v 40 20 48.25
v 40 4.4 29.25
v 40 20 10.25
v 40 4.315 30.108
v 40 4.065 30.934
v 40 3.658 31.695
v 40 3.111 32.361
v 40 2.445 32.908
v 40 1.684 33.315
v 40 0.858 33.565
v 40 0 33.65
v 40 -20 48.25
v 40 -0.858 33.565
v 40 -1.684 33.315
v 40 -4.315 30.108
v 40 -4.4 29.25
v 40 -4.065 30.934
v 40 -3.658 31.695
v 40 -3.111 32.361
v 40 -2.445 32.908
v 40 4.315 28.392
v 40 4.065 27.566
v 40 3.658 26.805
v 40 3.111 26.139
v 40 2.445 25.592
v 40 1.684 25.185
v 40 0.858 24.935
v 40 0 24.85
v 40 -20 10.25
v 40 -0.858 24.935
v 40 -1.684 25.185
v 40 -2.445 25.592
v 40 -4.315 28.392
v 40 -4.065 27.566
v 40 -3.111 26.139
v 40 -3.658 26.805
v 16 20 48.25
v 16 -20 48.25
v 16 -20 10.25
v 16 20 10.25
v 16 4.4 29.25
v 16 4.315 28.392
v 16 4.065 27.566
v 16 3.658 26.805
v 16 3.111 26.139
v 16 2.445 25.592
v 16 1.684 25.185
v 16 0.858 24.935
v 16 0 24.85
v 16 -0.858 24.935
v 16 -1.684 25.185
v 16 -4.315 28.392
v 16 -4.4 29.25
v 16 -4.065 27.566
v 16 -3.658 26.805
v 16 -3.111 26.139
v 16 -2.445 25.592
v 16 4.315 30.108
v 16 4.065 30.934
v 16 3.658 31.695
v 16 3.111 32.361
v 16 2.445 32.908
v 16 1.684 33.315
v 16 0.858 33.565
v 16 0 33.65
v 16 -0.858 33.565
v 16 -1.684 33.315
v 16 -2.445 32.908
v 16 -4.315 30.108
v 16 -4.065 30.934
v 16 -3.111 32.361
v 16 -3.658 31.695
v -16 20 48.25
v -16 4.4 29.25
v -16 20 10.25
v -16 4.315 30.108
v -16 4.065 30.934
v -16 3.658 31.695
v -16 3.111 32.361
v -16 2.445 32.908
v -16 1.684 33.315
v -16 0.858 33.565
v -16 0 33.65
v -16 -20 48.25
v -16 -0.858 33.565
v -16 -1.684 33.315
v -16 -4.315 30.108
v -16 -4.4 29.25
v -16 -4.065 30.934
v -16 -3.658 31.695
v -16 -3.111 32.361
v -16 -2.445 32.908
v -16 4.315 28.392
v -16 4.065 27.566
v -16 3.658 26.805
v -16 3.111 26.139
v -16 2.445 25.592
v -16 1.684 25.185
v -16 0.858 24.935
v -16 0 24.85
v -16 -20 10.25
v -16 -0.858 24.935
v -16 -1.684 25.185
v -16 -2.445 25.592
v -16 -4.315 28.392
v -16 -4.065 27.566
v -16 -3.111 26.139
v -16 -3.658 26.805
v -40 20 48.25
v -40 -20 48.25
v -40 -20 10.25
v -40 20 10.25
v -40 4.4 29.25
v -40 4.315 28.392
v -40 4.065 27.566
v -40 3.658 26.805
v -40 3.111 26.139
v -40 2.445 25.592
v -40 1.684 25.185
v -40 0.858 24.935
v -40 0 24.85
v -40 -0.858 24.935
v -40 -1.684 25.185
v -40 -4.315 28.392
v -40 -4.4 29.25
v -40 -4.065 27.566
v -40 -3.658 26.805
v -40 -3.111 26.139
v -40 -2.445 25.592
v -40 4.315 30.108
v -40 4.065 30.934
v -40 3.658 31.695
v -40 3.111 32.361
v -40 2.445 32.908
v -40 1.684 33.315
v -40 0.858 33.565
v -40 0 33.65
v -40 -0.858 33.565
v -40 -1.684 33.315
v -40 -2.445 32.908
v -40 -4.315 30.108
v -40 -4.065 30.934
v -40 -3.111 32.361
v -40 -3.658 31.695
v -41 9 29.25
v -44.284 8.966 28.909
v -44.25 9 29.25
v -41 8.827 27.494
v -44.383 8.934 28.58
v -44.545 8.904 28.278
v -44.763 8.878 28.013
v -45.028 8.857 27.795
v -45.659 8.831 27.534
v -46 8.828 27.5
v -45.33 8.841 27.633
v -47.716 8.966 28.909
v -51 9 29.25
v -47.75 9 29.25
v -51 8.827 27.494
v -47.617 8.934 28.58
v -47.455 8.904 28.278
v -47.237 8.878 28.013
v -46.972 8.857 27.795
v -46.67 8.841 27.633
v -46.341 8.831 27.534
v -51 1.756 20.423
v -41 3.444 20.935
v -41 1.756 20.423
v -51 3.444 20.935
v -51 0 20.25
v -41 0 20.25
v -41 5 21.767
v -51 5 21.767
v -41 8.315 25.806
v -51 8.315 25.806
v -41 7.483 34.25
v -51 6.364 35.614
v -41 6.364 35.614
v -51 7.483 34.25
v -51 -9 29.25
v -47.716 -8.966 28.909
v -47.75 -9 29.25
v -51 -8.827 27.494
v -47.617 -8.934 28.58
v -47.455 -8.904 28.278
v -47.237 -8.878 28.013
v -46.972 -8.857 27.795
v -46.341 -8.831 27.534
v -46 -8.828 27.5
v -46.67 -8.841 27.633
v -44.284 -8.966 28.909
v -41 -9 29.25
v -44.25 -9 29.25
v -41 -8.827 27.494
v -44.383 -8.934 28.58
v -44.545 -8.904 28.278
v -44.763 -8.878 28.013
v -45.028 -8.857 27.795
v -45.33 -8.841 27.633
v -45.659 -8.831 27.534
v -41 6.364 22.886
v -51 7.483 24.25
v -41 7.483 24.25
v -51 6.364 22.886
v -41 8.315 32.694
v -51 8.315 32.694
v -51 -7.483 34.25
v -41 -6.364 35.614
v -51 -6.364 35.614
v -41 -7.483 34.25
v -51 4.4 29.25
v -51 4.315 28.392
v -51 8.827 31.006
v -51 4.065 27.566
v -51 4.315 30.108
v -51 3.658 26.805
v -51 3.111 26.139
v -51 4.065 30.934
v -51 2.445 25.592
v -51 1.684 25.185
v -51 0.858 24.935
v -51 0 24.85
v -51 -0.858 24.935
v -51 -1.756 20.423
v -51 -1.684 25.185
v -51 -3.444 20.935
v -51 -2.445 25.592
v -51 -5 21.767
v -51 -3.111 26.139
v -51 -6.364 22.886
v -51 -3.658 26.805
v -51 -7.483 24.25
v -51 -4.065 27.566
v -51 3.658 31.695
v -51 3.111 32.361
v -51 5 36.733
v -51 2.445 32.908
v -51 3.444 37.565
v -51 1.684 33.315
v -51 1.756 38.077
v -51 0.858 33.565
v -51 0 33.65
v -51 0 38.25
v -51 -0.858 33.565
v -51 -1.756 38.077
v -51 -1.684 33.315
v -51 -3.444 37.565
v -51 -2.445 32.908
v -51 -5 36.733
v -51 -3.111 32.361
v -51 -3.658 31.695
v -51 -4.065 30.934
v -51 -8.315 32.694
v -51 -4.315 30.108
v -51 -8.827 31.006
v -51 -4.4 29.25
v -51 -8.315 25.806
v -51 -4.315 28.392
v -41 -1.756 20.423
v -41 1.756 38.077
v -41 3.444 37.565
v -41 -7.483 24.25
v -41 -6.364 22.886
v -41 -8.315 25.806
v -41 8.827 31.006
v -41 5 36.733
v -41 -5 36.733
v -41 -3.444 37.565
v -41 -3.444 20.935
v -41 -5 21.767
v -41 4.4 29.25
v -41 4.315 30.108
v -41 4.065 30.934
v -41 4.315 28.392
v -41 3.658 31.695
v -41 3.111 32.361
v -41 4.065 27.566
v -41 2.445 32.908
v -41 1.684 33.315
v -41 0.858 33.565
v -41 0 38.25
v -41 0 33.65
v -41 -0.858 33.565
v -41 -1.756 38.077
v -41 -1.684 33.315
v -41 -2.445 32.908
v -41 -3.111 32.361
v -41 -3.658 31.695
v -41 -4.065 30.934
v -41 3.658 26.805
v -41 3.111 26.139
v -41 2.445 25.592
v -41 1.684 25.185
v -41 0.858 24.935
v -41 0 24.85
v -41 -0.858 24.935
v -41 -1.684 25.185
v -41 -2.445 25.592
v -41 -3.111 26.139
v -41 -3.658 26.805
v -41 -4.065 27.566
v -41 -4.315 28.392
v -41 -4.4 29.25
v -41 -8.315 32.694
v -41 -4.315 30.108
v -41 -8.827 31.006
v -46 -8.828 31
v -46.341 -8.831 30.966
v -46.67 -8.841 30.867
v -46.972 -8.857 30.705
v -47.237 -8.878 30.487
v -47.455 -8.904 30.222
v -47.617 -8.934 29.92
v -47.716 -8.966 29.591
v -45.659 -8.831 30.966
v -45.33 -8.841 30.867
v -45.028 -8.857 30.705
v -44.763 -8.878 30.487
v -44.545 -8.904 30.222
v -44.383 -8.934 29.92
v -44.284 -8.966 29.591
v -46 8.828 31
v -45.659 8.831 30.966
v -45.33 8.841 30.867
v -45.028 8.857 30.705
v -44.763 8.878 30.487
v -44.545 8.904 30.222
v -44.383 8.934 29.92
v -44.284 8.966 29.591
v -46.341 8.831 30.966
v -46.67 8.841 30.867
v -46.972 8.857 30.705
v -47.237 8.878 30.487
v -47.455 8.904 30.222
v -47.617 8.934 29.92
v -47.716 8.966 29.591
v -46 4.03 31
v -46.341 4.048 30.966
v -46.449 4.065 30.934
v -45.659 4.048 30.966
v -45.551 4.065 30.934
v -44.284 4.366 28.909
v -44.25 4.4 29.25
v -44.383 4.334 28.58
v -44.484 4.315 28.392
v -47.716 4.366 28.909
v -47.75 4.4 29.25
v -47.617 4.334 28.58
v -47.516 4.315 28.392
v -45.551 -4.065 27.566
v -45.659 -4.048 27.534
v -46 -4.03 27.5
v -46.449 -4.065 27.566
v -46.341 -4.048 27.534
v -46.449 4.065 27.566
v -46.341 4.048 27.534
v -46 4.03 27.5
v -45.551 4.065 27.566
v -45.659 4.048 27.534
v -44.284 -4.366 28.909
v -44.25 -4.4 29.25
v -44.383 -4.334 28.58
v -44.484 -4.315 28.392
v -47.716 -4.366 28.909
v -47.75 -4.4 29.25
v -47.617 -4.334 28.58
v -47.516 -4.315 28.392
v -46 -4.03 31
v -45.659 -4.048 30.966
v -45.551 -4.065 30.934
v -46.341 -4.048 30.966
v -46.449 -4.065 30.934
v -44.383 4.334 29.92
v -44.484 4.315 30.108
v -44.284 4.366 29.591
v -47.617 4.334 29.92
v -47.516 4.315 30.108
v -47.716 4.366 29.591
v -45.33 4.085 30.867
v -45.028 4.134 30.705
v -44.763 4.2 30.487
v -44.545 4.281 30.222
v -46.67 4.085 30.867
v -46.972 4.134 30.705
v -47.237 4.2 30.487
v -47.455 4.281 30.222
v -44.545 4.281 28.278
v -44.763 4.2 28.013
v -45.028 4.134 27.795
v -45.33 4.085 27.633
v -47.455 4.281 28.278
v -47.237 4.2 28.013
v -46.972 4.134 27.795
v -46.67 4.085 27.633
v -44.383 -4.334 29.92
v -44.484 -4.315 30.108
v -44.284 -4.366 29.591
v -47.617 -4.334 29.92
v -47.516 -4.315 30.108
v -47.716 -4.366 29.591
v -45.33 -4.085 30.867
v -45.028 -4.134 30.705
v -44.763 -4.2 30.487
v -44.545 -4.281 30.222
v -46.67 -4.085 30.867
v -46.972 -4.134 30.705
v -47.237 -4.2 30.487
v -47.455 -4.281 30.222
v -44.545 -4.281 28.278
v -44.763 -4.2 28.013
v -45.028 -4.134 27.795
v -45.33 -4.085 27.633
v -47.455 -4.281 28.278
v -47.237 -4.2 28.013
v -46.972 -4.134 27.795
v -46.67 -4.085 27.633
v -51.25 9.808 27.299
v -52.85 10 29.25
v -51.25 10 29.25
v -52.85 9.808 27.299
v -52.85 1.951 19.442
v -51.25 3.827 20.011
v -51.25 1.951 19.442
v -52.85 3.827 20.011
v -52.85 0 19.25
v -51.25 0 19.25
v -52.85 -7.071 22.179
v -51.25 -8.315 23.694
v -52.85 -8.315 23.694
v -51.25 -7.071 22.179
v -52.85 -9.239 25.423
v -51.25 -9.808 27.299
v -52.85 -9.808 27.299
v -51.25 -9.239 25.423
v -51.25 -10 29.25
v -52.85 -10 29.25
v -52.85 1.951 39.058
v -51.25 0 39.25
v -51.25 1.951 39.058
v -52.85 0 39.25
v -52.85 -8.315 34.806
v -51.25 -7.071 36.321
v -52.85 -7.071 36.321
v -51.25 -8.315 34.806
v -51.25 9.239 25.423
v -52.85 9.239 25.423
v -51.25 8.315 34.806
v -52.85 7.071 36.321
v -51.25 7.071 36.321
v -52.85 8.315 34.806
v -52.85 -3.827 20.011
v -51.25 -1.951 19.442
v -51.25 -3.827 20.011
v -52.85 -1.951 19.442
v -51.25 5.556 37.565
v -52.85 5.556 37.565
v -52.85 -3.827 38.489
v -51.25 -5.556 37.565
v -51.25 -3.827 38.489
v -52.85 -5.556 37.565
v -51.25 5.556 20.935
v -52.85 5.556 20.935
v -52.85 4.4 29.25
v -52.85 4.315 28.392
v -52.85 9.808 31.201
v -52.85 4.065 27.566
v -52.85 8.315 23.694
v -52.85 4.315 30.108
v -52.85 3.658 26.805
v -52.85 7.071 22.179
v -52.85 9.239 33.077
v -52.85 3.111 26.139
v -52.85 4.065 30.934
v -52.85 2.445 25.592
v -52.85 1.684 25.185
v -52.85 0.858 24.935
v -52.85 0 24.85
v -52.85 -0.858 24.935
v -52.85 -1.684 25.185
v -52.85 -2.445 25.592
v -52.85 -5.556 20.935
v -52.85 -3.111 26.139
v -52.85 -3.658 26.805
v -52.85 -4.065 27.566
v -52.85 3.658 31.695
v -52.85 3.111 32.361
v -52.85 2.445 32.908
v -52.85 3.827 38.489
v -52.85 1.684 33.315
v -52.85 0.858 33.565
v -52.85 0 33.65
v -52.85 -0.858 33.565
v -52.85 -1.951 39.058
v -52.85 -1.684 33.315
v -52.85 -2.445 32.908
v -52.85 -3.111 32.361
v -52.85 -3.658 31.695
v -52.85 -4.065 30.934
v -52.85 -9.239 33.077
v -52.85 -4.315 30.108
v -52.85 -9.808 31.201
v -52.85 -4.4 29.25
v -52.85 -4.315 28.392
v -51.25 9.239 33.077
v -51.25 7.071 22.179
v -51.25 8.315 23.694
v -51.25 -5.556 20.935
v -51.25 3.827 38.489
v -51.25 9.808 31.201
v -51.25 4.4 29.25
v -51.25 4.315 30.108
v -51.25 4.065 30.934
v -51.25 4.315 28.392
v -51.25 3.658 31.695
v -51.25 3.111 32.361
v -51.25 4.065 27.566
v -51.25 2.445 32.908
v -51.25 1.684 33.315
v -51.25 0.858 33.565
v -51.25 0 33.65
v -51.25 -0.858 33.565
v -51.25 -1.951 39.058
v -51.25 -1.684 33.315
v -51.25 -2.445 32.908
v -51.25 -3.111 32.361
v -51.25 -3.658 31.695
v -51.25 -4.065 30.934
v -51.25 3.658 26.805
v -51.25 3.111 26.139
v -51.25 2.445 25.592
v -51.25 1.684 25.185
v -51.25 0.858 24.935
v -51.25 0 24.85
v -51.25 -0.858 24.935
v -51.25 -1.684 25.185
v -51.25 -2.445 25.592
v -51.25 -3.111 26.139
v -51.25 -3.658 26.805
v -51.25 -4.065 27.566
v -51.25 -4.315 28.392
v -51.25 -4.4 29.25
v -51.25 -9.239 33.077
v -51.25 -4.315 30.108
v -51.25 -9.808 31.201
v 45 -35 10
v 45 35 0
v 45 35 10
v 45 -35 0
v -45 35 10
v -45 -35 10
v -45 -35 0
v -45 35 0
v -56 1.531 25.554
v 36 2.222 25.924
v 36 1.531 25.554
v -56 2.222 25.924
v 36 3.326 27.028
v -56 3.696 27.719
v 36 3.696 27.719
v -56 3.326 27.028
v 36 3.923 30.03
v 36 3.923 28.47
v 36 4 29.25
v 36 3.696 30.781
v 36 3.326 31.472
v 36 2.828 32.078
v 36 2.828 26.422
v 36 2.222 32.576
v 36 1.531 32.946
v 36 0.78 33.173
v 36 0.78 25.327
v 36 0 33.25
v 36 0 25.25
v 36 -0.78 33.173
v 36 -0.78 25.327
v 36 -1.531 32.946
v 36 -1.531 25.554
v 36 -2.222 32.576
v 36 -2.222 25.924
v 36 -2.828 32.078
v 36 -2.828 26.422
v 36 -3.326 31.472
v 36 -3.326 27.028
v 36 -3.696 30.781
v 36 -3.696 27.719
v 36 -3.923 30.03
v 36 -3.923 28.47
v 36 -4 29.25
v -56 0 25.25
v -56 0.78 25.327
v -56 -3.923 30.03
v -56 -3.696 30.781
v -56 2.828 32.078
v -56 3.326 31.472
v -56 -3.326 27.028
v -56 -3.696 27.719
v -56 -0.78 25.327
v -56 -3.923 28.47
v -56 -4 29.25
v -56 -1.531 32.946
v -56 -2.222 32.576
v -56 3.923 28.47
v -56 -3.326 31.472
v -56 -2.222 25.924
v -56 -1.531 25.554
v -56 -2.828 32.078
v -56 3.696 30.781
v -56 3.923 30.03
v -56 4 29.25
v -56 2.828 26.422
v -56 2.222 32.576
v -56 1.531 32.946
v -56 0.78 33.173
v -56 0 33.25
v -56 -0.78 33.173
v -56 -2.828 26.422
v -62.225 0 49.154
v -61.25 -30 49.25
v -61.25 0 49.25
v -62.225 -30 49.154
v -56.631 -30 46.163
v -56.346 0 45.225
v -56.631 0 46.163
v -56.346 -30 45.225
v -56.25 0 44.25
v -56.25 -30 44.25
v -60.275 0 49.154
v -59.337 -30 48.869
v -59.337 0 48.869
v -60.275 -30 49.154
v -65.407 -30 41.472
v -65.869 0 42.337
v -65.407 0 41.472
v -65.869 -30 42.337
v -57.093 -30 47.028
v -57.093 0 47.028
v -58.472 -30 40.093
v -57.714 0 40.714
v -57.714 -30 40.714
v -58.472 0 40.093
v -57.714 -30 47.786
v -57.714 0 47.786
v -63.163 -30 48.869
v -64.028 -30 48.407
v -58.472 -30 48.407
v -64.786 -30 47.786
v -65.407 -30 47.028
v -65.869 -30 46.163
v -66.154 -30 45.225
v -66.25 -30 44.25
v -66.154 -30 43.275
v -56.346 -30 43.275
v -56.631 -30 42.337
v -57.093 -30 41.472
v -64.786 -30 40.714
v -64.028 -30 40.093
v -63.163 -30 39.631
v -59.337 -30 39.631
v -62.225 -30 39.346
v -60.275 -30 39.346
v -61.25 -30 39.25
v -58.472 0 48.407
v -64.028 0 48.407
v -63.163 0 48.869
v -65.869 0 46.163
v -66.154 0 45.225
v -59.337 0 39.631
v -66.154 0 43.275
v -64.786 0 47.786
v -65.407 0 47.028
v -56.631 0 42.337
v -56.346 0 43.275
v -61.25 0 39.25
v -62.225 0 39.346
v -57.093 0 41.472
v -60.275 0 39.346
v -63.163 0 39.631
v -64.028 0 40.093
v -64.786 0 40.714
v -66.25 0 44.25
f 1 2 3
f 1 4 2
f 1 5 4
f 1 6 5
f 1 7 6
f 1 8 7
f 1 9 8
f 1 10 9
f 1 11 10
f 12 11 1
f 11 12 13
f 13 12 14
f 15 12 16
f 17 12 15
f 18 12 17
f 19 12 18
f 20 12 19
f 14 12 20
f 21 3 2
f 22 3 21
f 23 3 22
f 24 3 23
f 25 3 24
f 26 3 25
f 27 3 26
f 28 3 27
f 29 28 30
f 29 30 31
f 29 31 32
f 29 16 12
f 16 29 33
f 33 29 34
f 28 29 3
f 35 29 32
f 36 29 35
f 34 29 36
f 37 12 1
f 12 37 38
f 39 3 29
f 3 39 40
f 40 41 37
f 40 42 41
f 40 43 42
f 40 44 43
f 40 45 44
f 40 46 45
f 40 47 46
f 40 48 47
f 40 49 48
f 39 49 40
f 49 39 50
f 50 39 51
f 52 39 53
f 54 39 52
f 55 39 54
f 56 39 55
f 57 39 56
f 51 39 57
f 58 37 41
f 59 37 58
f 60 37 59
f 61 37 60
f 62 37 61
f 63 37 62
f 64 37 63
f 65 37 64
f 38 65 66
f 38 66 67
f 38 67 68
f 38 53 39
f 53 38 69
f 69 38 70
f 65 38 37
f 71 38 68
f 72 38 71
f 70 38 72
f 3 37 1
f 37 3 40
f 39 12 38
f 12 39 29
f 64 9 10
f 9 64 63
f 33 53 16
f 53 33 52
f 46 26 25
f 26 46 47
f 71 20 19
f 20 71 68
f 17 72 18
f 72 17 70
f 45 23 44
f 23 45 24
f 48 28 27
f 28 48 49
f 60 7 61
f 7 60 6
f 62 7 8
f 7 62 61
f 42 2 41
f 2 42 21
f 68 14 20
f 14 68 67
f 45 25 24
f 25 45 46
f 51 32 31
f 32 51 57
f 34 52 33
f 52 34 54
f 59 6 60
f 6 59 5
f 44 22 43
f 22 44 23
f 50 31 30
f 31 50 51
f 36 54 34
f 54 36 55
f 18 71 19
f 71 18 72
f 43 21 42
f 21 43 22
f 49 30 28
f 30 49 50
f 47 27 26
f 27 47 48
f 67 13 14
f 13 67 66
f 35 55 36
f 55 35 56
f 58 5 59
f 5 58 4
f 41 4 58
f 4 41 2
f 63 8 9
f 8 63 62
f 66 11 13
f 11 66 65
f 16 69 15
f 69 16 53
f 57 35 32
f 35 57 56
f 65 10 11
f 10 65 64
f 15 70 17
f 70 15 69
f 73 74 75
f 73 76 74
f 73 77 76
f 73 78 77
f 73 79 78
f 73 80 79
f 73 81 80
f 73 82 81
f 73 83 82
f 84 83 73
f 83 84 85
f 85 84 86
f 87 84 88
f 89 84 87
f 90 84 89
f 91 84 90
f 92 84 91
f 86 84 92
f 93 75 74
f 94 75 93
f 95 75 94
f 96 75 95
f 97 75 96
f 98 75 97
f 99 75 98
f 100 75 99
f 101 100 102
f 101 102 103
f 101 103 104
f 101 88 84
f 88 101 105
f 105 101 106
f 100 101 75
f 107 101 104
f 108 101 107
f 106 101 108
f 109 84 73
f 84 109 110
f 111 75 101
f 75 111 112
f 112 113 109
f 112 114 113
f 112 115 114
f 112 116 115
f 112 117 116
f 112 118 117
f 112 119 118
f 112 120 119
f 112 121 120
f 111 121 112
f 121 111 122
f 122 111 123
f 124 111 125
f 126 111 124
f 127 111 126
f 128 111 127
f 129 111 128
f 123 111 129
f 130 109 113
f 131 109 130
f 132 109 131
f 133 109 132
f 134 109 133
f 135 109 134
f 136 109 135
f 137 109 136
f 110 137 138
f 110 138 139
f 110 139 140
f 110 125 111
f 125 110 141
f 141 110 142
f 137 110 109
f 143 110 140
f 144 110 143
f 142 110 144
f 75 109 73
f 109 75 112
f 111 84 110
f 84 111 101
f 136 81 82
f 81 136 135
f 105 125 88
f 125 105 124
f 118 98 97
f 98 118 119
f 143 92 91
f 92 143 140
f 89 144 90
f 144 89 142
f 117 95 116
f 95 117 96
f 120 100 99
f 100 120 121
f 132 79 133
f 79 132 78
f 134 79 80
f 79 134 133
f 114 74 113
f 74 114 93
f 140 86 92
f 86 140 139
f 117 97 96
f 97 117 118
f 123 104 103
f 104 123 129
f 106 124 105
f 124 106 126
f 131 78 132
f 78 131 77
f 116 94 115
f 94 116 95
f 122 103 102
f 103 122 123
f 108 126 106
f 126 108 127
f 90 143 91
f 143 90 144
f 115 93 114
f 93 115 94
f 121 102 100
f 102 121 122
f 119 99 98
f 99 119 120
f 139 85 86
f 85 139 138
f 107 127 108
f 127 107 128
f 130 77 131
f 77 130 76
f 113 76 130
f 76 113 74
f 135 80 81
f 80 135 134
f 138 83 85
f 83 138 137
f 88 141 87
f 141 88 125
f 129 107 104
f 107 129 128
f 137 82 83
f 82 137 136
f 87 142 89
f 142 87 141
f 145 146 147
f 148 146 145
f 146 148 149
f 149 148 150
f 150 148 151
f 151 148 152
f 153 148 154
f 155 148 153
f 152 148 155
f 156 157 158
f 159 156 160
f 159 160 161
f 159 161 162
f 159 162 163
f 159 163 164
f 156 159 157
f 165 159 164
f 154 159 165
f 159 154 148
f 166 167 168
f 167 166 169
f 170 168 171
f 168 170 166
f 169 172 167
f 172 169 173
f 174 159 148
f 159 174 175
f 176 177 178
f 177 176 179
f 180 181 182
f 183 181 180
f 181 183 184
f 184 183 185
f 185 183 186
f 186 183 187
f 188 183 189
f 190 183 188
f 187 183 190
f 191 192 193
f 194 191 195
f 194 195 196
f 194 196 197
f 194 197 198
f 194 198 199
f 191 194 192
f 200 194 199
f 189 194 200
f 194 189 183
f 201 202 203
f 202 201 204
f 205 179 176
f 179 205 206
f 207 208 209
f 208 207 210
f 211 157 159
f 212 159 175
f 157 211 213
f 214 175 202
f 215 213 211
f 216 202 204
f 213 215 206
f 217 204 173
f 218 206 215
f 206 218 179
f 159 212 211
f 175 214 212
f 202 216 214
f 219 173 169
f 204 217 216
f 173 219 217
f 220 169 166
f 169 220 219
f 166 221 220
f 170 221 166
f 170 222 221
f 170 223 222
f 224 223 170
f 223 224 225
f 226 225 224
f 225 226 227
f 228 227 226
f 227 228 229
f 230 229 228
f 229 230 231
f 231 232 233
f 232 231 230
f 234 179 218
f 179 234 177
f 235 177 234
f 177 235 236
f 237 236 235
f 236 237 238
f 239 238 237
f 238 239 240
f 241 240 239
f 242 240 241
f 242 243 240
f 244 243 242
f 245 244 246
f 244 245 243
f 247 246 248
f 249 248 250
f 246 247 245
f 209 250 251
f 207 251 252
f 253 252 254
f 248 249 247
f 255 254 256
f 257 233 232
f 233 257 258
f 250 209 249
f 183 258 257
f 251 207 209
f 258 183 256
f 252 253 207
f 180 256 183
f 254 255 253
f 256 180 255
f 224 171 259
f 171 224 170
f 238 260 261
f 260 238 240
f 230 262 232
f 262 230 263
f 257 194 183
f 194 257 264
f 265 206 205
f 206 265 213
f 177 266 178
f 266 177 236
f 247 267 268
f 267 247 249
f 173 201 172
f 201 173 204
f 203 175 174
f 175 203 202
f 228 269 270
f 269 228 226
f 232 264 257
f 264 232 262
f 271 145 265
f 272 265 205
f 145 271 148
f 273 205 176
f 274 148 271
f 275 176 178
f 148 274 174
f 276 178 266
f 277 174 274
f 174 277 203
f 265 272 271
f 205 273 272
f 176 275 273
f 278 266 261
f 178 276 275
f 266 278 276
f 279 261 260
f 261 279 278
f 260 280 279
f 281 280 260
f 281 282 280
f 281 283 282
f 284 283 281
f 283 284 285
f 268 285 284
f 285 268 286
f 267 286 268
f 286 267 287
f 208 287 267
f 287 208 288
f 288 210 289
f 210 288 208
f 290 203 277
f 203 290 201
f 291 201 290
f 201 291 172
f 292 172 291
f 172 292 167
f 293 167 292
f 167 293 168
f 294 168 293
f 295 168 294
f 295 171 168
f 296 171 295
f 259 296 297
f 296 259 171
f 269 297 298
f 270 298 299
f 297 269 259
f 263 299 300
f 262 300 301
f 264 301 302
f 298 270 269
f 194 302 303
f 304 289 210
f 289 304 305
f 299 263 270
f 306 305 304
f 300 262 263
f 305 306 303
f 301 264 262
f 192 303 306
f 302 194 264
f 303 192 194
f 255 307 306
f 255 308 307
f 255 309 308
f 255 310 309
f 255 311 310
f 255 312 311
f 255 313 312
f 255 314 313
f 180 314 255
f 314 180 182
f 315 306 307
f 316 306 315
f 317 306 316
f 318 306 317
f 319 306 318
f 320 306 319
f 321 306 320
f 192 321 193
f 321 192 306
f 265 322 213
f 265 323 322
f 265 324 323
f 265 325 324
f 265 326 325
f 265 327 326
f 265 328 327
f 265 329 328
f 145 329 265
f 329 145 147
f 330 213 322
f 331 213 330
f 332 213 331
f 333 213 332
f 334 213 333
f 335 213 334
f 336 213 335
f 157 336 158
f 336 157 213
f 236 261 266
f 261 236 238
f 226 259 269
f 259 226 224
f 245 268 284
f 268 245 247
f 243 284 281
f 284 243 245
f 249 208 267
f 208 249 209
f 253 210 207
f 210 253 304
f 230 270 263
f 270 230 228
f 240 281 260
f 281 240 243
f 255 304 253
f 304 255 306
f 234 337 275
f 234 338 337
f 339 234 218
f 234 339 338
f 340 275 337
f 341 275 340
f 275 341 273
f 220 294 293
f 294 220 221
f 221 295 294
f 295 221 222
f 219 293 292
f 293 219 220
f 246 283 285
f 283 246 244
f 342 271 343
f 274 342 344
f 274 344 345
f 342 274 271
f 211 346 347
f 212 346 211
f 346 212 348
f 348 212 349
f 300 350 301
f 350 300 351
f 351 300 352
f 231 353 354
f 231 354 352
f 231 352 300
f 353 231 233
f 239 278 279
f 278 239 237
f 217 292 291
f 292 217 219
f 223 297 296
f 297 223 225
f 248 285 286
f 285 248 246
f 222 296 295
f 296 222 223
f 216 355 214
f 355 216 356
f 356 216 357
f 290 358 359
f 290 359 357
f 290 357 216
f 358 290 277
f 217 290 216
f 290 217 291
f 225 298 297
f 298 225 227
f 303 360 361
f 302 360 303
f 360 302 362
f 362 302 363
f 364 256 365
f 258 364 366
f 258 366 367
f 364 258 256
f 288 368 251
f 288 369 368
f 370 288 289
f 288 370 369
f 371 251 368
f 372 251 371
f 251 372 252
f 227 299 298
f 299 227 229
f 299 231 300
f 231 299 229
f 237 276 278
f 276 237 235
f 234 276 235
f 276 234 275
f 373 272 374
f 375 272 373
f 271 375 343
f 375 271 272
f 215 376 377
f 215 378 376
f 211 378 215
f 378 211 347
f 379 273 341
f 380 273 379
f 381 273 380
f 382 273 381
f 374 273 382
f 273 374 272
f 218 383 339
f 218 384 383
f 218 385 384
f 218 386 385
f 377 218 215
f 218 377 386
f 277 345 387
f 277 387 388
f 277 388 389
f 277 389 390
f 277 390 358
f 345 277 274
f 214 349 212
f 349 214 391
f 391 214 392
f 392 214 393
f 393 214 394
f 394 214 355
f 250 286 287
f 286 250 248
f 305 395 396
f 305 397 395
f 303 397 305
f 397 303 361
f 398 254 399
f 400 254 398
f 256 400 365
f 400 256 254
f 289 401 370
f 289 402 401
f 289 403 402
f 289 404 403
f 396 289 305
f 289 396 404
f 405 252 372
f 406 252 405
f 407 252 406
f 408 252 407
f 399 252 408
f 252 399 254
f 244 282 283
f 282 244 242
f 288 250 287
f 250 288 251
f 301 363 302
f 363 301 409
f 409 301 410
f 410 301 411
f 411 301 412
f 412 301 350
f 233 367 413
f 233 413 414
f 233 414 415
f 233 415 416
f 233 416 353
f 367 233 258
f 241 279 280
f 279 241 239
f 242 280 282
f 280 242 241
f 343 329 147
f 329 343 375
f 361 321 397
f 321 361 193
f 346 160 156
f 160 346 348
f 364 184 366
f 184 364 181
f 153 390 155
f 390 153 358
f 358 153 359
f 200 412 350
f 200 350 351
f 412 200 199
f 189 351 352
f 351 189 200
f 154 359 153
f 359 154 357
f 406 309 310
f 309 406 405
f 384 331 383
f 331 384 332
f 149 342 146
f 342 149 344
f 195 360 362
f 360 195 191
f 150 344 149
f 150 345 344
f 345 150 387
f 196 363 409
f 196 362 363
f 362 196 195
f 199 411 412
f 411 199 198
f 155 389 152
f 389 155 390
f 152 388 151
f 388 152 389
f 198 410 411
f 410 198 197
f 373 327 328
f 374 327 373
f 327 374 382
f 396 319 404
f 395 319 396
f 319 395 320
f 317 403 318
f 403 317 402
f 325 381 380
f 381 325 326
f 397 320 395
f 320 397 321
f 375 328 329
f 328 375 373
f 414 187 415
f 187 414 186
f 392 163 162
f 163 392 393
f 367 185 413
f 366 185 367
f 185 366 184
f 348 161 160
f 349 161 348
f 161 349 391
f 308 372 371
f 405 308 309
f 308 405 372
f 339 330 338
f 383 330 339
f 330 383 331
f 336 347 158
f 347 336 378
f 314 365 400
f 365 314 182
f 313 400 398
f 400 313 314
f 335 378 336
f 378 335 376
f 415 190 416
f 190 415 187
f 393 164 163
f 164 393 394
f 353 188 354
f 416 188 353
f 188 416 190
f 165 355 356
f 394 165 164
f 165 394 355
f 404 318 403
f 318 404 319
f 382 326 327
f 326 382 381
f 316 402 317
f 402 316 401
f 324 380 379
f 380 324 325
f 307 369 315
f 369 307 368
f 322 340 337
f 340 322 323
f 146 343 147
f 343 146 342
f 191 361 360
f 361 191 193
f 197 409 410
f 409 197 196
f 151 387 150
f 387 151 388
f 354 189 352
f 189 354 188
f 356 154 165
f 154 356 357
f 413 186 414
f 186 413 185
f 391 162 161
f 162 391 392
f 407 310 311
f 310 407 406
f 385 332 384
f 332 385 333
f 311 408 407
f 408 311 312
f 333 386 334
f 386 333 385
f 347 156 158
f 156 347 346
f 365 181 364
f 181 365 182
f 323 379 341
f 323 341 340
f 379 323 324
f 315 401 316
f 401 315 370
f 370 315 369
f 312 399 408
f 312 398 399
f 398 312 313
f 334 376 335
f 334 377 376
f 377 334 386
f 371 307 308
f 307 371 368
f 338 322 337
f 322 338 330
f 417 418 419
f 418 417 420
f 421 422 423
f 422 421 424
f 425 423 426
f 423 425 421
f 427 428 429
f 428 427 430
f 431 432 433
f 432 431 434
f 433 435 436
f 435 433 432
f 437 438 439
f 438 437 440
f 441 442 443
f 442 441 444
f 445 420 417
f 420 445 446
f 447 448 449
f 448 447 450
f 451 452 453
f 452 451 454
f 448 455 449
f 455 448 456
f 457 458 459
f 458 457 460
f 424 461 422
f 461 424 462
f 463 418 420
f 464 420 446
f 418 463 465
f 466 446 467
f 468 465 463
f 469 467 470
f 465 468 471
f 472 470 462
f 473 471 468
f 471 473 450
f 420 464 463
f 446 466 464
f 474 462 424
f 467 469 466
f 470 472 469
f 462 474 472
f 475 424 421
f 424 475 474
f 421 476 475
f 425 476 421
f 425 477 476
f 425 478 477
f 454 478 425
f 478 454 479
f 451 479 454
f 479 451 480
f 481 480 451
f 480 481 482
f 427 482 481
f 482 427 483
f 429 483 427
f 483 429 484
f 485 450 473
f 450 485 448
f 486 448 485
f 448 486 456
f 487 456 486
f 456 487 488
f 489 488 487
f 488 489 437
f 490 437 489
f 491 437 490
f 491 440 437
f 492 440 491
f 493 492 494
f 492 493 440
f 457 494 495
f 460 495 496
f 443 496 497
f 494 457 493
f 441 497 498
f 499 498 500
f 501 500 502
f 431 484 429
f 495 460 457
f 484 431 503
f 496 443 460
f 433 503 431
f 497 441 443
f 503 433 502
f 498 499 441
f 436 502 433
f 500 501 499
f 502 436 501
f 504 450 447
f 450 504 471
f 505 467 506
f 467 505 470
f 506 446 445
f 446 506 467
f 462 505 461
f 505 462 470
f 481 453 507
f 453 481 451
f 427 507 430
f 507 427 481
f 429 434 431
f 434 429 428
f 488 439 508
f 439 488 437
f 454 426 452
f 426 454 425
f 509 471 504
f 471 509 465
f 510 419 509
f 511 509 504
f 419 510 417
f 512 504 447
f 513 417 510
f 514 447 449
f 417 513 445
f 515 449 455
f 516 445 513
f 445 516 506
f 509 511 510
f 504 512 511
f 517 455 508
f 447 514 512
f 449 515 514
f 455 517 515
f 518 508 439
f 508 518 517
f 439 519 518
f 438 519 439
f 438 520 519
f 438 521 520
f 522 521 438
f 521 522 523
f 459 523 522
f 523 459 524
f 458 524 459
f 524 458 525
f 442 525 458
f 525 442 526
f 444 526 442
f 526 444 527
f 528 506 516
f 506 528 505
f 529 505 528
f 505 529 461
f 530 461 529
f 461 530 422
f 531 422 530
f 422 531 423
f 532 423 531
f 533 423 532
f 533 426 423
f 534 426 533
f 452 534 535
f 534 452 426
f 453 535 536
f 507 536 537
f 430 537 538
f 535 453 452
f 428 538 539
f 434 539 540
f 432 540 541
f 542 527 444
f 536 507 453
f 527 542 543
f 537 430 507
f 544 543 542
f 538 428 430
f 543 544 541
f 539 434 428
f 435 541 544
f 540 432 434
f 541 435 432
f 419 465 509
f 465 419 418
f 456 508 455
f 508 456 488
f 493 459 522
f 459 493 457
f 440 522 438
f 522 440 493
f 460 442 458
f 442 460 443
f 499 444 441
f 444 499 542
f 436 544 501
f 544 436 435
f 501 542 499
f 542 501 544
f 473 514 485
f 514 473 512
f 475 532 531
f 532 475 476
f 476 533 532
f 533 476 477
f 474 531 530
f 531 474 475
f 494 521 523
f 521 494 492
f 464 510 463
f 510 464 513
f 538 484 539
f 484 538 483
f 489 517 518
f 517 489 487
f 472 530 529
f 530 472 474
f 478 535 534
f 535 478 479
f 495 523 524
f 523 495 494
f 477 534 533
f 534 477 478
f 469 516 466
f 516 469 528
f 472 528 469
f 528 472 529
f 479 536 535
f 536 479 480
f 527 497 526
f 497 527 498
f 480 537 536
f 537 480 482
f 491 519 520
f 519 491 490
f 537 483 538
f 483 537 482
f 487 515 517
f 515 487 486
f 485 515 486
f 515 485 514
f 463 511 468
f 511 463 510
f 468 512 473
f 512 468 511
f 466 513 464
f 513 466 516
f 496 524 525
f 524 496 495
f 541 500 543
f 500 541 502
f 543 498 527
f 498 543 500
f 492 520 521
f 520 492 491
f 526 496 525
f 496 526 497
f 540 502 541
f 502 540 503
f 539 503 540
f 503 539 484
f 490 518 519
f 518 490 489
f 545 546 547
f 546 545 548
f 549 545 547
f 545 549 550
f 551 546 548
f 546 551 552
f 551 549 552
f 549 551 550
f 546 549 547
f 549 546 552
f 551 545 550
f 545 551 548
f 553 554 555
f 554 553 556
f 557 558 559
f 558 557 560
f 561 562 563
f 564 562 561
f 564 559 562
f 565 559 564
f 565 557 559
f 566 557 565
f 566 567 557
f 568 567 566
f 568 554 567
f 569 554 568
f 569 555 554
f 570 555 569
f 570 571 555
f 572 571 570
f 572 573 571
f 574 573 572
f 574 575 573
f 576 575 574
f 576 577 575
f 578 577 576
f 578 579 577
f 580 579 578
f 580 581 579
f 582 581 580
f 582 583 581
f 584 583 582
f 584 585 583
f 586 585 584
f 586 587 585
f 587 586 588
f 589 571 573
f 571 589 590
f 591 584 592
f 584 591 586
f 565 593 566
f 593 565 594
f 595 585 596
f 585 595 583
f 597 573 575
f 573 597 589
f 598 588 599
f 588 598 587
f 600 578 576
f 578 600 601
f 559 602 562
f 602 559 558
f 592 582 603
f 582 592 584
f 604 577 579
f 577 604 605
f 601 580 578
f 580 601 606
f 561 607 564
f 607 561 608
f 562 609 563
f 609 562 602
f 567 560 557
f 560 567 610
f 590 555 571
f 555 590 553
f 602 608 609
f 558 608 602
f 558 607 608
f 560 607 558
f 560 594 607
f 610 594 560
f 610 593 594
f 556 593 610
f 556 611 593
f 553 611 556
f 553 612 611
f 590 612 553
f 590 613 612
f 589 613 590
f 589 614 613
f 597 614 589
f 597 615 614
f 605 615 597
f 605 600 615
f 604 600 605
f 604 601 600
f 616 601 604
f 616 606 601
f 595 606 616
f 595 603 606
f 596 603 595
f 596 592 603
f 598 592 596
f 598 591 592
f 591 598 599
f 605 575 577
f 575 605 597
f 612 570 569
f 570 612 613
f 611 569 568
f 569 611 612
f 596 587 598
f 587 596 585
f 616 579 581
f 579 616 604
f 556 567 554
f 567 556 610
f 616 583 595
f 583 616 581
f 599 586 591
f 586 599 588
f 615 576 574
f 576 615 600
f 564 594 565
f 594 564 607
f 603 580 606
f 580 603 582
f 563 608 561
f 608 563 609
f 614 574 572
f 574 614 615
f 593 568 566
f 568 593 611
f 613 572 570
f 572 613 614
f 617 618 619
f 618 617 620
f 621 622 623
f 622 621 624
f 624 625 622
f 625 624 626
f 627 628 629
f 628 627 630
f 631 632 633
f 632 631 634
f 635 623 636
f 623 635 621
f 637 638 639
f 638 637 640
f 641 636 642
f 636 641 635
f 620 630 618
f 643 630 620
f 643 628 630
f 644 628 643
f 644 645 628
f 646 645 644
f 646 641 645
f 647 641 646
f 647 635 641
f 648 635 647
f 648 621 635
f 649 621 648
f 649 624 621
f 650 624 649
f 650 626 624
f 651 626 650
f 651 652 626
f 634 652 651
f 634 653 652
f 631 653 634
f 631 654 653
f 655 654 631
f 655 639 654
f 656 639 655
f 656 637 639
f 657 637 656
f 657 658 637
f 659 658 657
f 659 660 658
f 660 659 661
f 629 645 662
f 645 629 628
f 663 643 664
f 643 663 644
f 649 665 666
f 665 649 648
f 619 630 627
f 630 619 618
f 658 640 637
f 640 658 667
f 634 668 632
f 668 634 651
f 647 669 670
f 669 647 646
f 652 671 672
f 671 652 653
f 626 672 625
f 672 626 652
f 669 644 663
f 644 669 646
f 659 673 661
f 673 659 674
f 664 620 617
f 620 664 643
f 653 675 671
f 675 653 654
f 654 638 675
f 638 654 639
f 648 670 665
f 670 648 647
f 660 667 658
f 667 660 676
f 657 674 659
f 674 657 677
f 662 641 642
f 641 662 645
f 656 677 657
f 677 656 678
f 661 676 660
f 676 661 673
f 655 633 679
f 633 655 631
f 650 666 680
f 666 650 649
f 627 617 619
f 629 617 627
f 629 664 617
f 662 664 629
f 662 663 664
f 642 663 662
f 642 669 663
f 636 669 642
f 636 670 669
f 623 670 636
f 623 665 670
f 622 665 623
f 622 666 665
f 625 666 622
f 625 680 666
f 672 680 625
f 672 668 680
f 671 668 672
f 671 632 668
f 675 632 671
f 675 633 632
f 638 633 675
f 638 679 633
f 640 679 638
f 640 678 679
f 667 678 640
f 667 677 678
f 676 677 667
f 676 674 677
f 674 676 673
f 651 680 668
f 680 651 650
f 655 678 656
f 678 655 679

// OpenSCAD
$fn = 32;

// ------------------------------------------------------------------------
// Machine vise: screw d8, jaws 24 x 38 mm
// Every part is its own module, assembly() places every instance.
// ------------------------------------------------------------------------

// --- part 1 ---
module vise_bed() {
  difference() {
    translate([-45, -35, 0]) cube([90, 70, 10]);
  }
}

// --- part 2 ---
module vise_jaw() {
  difference() {
    translate([-12, -20, 0]) cube([24, 40, 38]);
    translate([0, 0, 19]) rotate([0, 90, 0]) cylinder(h = 26, d = 8.8, center = true);
  }
}

// --- part 3 ---
module vise_screw() {
  translate([0, 0, -46]) cylinder(h = 92, d = 8);
}

// --- part 4 ---
module screw_collar() {
  difference() {
    cylinder(h = 10, d = 18);
    translate([0, 0, -1]) cylinder(h = 12, d = 8.8);
    translate([0, 0, 5]) rotate([90, 0, 0]) cylinder(h = 20, d = 3.5, center = true);
  }
}

// --- part 5 ---
module screw_washer() {
  difference() {
      translate([0, 0, 0]) cylinder(h = 1.6, d = 20);
      translate([0, 0, -1]) cylinder(h = 3.6, d = 8.8);
    }
}

// --- part 6 ---
module vise_handle() {
  cylinder(h = 30, d = 10);
}

// --- assembly ---
module assembly() {
  color([0.80, 0.24, 0.20]) translate([0, 0, 0]) rotate([0, 0, 0]) vise_bed();
  color([0.20, 0.45, 0.75]) translate([28, 0, 10.25]) rotate([0, 0, 0]) vise_jaw();
  color([0.25, 0.62, 0.32]) translate([-28, 0, 10.25]) rotate([0, 0, 0]) vise_jaw();
  color([0.92, 0.70, 0.18]) translate([-10, 0, 29.25]) rotate([0, 90, 0]) vise_screw();
  color([0.58, 0.35, 0.70]) translate([-51, 0, 29.25]) rotate([0, 90, 0]) screw_collar();
  color([0.16, 0.66, 0.66]) translate([-52.85, 0, 29.25]) rotate([0, 90, 0]) screw_washer();
  color([0.85, 0.48, 0.18]) translate([-61.25, 0, 44.25]) rotate([90, 0, 0]) vise_handle();
}

assembly();
